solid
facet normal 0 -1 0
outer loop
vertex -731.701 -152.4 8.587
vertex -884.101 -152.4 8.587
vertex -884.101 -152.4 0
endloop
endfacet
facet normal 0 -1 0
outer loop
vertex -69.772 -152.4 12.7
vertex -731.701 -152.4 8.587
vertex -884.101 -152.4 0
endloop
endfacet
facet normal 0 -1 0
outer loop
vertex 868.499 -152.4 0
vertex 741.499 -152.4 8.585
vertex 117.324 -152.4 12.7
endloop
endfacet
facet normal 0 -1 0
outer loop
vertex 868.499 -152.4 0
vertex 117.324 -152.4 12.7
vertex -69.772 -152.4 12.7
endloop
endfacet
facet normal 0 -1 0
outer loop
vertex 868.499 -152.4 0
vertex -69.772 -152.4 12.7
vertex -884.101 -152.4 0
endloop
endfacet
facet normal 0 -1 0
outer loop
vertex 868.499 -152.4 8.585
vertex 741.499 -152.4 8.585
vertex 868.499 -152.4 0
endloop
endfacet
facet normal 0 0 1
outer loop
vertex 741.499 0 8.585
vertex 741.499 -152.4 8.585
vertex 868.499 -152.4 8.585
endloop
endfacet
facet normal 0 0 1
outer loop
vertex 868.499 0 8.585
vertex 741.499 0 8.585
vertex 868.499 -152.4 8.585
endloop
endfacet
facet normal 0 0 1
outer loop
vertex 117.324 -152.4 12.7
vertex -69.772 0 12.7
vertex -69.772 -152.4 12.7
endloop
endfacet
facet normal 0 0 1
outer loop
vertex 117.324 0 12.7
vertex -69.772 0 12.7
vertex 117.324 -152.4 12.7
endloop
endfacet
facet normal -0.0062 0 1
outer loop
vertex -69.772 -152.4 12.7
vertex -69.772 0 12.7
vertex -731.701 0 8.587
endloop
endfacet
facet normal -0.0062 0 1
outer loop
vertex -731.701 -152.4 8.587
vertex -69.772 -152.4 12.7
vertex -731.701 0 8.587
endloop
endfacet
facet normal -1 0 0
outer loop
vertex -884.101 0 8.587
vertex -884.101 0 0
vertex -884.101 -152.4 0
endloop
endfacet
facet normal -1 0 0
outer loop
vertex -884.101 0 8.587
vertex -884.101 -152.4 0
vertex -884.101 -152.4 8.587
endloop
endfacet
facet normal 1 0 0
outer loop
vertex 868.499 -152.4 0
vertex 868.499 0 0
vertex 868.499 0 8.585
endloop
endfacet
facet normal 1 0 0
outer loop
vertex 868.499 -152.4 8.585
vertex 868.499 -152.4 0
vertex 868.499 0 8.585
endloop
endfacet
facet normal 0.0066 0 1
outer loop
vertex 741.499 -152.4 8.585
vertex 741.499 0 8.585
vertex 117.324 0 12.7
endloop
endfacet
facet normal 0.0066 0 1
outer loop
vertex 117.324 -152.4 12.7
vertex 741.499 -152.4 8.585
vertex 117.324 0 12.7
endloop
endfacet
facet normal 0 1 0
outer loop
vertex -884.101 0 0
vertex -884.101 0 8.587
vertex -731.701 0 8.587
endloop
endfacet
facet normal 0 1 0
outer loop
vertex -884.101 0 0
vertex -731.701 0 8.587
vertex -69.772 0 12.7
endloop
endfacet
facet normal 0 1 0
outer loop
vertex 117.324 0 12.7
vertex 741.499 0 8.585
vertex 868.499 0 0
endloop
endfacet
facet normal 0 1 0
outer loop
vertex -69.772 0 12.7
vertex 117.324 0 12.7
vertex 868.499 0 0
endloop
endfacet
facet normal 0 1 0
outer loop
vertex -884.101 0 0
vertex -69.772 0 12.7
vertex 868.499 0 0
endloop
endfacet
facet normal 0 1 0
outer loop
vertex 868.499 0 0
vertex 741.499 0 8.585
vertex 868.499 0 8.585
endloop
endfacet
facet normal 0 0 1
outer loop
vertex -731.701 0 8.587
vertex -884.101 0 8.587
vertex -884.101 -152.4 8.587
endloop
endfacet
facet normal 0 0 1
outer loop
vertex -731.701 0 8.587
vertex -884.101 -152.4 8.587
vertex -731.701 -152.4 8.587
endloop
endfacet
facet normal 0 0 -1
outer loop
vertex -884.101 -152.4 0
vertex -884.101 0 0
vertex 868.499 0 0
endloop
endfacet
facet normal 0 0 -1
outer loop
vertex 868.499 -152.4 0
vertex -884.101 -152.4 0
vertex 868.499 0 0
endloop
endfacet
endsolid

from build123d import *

# Parameters (mm, degrees)
F0_W     = 152.4
F0_H     = 8.58716
F0_W_2   = 187.096558
F0_H_2   = 12.7
F0_W_3   = 127
F0_H_3   = 8.5852
F1_DEPTH = 152.4


with BuildPart() as f1:
    # F0 (on Front) → F1 (new body)
    with BuildSketch(Plane.XZ):
        with Locations((-807.900843, 4.29358)):
            Rectangle(F0_W, F0_H)
        Polygon((-731.700843, 8.58716), (-731.700843, 0), (-69.772355, 0), (-69.772355, 12.7), align=None)
        with Locations((23.775924, 6.35)):
            Rectangle(F0_W_2, F0_H_2)
        Polygon((117.324203, 12.7), (117.324203, 0), (741.499157, 0), (741.499157, 8.5852), align=None)
        with Locations((804.999157, 4.2926)):
            Rectangle(F0_W_3, F0_H_3)
    extrude(amount=F1_DEPTH)


solid = f1.part
